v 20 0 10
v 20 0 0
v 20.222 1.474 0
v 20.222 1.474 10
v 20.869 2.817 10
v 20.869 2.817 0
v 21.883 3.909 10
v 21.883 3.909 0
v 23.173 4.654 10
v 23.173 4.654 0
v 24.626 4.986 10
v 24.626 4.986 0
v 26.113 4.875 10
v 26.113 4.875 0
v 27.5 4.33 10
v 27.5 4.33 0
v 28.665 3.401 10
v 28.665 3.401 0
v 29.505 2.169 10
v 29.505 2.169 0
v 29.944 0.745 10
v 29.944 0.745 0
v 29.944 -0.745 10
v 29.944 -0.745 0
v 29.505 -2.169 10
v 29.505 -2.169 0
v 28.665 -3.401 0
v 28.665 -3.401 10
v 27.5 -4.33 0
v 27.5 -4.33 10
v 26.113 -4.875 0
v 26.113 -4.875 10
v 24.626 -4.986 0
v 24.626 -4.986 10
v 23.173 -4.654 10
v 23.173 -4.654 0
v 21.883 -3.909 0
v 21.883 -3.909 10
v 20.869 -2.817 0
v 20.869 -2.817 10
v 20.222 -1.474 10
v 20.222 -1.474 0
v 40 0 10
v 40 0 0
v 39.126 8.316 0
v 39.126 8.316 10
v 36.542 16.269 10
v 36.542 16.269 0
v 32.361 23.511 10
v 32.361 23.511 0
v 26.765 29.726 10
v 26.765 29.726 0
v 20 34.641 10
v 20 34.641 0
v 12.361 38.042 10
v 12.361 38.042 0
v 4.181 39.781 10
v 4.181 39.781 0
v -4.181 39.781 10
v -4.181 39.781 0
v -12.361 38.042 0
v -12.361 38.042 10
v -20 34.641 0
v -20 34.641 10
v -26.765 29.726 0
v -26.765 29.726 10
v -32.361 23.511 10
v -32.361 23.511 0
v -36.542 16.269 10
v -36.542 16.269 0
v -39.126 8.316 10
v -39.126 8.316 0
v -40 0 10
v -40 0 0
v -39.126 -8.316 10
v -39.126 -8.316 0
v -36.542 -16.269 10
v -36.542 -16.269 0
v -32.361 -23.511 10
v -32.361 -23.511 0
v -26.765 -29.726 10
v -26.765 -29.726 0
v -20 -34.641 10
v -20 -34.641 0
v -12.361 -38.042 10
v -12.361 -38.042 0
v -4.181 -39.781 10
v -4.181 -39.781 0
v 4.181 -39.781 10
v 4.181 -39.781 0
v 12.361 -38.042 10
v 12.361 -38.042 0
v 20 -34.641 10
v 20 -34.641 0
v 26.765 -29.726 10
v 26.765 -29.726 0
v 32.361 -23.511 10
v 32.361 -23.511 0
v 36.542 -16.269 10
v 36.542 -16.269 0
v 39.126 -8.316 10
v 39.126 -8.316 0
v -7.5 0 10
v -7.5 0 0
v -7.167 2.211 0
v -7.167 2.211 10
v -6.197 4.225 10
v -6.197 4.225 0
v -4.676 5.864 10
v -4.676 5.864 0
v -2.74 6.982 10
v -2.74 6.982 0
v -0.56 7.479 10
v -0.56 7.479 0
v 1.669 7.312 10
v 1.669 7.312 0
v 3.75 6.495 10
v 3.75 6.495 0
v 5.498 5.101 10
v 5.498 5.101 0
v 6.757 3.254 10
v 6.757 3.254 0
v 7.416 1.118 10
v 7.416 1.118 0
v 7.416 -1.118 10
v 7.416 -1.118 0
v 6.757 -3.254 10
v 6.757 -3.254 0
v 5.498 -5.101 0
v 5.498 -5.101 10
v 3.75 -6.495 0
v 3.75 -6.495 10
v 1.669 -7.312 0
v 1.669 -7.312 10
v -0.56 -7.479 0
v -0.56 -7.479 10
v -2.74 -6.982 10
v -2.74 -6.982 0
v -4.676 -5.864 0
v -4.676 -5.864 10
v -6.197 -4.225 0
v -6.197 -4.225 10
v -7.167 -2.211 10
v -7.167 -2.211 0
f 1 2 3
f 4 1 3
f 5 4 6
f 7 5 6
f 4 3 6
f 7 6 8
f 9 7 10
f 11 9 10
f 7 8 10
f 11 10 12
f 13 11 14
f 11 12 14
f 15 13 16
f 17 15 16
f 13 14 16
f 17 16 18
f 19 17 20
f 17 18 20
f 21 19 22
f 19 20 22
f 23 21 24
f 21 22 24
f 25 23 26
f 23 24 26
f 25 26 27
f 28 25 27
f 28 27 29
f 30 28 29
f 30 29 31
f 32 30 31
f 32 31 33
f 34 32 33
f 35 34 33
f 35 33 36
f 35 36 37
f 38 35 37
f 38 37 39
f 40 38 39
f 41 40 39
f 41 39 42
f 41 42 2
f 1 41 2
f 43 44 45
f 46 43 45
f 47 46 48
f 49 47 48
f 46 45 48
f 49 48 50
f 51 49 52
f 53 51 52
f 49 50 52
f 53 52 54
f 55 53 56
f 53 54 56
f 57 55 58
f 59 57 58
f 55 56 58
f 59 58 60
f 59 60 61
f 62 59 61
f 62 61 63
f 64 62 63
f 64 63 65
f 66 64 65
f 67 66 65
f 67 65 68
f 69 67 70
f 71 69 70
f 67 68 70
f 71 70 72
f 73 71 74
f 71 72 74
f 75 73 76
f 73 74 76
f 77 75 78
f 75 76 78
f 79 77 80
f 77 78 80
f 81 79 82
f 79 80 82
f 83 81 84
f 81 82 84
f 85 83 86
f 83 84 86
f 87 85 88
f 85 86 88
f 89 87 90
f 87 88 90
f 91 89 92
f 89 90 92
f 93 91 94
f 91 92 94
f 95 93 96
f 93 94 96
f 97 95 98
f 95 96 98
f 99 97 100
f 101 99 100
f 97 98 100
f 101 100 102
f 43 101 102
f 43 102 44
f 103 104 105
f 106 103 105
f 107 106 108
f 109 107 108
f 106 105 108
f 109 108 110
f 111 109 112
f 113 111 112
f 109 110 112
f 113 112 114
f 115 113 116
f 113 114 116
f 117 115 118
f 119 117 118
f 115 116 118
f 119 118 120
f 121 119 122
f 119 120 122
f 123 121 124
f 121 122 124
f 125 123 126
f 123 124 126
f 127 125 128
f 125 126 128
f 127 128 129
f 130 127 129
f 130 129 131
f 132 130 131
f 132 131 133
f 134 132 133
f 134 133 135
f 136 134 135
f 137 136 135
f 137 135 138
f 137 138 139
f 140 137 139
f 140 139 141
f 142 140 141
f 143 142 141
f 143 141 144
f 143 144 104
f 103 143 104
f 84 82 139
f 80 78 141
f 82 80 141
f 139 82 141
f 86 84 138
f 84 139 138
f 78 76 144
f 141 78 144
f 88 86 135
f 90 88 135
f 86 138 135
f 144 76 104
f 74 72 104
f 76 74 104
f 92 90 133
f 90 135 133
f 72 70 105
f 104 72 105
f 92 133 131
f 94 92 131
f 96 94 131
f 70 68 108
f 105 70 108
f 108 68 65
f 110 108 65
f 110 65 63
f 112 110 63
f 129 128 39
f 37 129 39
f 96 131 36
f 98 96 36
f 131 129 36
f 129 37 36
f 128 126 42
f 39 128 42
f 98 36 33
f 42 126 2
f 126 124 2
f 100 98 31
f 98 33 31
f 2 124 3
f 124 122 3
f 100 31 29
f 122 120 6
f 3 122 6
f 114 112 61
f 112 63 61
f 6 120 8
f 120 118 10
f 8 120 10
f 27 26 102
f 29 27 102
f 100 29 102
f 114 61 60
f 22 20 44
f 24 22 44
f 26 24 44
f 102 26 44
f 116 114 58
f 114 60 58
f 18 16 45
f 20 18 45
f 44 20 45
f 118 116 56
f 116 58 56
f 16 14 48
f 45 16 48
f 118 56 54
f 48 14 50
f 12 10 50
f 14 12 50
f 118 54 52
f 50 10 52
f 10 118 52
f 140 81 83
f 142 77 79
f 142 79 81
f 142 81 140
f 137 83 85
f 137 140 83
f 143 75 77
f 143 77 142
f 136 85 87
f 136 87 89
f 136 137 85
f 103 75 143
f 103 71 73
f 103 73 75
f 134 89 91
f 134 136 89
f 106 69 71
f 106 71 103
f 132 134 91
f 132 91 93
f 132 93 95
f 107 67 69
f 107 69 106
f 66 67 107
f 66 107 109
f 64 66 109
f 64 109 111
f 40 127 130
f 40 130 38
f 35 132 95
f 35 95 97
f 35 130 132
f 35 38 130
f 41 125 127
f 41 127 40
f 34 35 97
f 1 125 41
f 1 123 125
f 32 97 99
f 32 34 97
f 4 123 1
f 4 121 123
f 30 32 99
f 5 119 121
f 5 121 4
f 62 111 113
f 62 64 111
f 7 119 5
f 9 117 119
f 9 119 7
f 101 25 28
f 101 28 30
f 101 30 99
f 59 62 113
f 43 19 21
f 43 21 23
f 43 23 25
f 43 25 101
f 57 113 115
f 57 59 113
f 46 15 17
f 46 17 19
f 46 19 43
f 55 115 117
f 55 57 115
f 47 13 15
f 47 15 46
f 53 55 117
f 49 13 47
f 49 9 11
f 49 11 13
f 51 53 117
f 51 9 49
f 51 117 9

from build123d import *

# Parameters (mm, degrees)
F0_R     = 40
F1_DEPTH = 10
F4_D     = 10
F5_D     = 15


with BuildPart() as f1:
    # F0 (on Top) → F1 (new body)
    with BuildSketch(Plane.XY):
        Circle(F0_R)
    extrude(amount=F1_DEPTH)

    # F4 (through all)
    with Locations(Plane.XY.offset(10)):
        with Locations((25, 0)):
            Hole(F4_D / 2)

    # F5 (through all)
    with Locations(Plane.XY.offset(10)):
        with Locations((0, 0)):
            Hole(F5_D / 2)


solid = f1.part
